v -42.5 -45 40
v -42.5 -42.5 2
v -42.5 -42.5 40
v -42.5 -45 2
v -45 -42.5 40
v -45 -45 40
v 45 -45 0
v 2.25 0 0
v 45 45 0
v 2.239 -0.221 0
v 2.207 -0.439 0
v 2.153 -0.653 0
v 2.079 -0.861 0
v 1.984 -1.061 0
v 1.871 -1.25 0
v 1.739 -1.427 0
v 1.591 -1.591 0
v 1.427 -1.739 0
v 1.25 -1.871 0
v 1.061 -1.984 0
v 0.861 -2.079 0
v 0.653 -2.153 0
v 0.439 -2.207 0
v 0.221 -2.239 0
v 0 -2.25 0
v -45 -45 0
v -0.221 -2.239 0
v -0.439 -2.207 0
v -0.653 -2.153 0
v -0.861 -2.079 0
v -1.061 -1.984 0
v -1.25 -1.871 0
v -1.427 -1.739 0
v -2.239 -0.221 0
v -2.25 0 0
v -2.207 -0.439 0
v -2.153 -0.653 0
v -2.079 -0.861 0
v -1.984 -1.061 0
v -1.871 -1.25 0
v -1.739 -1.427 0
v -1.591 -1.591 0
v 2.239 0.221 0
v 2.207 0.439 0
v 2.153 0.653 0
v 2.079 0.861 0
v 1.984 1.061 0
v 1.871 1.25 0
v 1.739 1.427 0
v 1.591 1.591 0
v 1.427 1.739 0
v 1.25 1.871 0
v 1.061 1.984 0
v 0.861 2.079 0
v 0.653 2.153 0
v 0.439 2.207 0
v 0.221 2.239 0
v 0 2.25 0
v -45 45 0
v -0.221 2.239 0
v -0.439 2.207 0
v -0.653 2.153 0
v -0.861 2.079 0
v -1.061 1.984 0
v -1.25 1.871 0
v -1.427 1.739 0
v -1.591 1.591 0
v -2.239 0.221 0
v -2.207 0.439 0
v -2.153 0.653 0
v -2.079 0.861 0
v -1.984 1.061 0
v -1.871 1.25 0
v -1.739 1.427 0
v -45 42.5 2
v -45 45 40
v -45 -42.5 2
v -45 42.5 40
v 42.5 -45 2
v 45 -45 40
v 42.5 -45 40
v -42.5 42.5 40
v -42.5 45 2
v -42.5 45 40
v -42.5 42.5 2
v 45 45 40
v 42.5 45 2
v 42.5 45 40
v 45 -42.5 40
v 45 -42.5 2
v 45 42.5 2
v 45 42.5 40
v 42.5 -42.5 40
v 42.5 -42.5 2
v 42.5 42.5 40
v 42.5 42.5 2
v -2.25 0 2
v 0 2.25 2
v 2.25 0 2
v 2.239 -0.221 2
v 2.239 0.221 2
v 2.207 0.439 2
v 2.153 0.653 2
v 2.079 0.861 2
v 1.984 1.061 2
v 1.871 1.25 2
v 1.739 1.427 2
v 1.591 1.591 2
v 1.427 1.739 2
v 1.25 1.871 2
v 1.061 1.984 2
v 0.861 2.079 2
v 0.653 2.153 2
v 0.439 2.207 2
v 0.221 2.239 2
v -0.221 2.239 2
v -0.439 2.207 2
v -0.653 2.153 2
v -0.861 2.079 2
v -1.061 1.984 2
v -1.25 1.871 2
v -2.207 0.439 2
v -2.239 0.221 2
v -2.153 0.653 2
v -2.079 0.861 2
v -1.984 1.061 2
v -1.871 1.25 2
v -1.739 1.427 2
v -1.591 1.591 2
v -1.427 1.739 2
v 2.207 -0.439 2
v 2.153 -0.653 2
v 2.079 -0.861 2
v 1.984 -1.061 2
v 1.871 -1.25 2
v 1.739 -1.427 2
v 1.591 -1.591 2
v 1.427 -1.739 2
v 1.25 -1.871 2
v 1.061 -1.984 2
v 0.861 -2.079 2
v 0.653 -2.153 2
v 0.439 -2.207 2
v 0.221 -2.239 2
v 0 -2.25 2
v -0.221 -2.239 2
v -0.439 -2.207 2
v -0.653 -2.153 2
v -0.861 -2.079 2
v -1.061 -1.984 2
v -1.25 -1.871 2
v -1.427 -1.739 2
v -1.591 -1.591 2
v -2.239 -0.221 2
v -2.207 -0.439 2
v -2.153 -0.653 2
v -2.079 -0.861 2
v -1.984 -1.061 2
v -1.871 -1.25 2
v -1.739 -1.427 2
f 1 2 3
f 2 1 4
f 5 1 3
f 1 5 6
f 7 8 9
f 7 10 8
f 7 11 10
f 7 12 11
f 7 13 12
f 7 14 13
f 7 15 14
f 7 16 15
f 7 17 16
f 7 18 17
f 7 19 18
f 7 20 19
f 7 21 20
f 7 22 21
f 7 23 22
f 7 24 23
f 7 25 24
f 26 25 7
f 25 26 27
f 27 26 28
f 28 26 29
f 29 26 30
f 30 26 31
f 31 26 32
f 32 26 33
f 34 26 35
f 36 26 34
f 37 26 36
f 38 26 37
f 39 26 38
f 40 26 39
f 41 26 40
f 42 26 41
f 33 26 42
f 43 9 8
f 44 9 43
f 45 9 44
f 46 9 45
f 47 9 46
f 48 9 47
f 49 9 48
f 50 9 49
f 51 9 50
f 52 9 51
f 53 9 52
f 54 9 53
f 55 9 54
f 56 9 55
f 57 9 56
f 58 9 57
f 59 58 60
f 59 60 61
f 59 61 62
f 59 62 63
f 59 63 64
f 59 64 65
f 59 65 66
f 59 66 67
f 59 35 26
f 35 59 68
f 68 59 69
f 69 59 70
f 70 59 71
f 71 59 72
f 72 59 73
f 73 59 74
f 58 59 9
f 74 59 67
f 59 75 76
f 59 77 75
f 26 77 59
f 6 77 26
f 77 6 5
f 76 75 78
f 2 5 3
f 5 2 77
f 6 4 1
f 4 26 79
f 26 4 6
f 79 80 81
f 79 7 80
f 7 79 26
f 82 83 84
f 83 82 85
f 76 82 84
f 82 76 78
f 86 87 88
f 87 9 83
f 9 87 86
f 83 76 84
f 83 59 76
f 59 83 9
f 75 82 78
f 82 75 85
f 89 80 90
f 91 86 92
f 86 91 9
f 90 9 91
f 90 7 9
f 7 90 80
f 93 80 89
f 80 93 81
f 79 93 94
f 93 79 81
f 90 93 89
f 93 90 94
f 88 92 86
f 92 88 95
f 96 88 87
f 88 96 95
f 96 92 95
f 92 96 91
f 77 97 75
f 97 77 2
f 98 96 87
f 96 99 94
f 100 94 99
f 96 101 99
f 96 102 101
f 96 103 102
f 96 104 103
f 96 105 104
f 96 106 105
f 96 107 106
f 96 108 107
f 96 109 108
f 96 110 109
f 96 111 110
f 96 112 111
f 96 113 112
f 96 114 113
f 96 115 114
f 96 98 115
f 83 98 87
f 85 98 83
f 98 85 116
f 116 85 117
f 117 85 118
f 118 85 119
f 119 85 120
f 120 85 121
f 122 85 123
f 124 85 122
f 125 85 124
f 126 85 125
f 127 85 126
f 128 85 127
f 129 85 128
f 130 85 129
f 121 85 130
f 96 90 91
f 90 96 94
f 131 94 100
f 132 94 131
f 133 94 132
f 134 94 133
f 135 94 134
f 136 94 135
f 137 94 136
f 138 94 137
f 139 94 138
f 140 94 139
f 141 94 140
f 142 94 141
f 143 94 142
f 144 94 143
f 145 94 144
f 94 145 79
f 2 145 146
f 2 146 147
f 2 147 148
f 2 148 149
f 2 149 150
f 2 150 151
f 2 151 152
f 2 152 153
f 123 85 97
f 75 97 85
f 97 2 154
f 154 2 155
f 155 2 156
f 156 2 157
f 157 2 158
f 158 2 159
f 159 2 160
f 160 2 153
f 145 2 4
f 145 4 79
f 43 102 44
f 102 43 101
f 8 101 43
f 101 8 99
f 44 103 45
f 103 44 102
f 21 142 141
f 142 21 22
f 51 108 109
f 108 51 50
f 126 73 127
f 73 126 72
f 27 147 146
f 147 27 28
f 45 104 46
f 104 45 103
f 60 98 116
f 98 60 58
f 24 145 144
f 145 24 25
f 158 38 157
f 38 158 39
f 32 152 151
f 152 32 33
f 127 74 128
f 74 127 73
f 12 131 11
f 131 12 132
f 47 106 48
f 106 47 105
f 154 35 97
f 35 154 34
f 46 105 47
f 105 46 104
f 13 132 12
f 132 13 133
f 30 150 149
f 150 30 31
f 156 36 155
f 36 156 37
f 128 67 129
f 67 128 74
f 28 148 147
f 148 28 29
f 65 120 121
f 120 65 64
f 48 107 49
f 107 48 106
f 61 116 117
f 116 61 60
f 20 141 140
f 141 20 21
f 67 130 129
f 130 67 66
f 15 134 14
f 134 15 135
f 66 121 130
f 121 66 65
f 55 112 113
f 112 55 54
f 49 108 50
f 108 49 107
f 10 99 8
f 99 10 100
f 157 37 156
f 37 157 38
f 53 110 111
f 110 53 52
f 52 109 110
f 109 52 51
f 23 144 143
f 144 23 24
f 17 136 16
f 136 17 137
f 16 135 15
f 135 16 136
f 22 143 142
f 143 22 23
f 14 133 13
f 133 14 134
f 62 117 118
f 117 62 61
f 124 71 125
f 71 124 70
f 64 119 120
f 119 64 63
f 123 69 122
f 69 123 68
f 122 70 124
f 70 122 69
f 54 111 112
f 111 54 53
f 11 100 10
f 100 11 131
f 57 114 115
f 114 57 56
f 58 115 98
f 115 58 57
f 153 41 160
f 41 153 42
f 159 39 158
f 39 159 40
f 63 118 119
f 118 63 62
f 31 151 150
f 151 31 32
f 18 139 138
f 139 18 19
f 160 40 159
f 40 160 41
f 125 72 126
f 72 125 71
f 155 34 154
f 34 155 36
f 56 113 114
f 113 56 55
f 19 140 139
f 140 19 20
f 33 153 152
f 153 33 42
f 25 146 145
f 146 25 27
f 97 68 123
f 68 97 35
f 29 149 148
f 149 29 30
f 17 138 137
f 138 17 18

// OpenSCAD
// DIY magnetic stirrer housing for 80 mm PC case fan
// Print orientation: top plate on bed (z = 0), walls build upward (+Z)

$fn = 64;

// ---- Dimensions (mm) ----
plate_t      = 2;     // top plate thickness
wall_t       = 2.5;   // wall thickness
box_h        = 40;    // outer height of box (top of walls)
outer_x      = 90;    // outer size in X
outer_y      = 90;    // outer size in Y
hole_d       = 4.5;   // M4 screw hole diameter
hole_pitch   = 71.5;  // square pattern pitch for screw holes
notch_w      = 12;    // cable notch width
notch_bottom = 8;     // notch depth from open edge (z = 32 to z = 40)
eps          = 0.5;   // cutter overshoot past faces

// ---- Model ----
difference() {
    union() {
        // Top plate
        translate([-outer_x / 2, -outer_y / 2, 0])
            cube([outer_x, outer_y, plate_t]);

        // Four walls, 90 x 90 outer, rising to z = box_h
        for (sx = [-1, 1], sy = [-1, 1])
            translate([sx > 0 ? outer_x / 2 - wall_t : -outer_x / 2,
                       sy > 0 ? outer_y / 2 - wall_t : -outer_y / 2,
                       0])
                cube([wall_t, wall_t, box_h]);
    }

    // Screw holes through top plate on 71.5 mm square pattern
    for (i = [0 : 3]) {
        x = -hole_pitch / 2 + (i - 1.5) * hole_pitch;
        y = -hole_pitch / 2 + (i - 1.5) * hole_pitch;
        translate([x, y, -eps])
            cylinder(d = hole_d, h = plate_t + 2 * eps);
    }

    // Cable notch in one wall: 12 mm wide, centred along wall,
    // from z = 32 to z = 40 (open edge is at z = box_h)
    translate([-outer_x / 2 - eps, -notch_w / 2, box_h - notch_bottom])
        cube([notch_w + 2 * eps, wall_t, notch_bottom + eps]);
}
